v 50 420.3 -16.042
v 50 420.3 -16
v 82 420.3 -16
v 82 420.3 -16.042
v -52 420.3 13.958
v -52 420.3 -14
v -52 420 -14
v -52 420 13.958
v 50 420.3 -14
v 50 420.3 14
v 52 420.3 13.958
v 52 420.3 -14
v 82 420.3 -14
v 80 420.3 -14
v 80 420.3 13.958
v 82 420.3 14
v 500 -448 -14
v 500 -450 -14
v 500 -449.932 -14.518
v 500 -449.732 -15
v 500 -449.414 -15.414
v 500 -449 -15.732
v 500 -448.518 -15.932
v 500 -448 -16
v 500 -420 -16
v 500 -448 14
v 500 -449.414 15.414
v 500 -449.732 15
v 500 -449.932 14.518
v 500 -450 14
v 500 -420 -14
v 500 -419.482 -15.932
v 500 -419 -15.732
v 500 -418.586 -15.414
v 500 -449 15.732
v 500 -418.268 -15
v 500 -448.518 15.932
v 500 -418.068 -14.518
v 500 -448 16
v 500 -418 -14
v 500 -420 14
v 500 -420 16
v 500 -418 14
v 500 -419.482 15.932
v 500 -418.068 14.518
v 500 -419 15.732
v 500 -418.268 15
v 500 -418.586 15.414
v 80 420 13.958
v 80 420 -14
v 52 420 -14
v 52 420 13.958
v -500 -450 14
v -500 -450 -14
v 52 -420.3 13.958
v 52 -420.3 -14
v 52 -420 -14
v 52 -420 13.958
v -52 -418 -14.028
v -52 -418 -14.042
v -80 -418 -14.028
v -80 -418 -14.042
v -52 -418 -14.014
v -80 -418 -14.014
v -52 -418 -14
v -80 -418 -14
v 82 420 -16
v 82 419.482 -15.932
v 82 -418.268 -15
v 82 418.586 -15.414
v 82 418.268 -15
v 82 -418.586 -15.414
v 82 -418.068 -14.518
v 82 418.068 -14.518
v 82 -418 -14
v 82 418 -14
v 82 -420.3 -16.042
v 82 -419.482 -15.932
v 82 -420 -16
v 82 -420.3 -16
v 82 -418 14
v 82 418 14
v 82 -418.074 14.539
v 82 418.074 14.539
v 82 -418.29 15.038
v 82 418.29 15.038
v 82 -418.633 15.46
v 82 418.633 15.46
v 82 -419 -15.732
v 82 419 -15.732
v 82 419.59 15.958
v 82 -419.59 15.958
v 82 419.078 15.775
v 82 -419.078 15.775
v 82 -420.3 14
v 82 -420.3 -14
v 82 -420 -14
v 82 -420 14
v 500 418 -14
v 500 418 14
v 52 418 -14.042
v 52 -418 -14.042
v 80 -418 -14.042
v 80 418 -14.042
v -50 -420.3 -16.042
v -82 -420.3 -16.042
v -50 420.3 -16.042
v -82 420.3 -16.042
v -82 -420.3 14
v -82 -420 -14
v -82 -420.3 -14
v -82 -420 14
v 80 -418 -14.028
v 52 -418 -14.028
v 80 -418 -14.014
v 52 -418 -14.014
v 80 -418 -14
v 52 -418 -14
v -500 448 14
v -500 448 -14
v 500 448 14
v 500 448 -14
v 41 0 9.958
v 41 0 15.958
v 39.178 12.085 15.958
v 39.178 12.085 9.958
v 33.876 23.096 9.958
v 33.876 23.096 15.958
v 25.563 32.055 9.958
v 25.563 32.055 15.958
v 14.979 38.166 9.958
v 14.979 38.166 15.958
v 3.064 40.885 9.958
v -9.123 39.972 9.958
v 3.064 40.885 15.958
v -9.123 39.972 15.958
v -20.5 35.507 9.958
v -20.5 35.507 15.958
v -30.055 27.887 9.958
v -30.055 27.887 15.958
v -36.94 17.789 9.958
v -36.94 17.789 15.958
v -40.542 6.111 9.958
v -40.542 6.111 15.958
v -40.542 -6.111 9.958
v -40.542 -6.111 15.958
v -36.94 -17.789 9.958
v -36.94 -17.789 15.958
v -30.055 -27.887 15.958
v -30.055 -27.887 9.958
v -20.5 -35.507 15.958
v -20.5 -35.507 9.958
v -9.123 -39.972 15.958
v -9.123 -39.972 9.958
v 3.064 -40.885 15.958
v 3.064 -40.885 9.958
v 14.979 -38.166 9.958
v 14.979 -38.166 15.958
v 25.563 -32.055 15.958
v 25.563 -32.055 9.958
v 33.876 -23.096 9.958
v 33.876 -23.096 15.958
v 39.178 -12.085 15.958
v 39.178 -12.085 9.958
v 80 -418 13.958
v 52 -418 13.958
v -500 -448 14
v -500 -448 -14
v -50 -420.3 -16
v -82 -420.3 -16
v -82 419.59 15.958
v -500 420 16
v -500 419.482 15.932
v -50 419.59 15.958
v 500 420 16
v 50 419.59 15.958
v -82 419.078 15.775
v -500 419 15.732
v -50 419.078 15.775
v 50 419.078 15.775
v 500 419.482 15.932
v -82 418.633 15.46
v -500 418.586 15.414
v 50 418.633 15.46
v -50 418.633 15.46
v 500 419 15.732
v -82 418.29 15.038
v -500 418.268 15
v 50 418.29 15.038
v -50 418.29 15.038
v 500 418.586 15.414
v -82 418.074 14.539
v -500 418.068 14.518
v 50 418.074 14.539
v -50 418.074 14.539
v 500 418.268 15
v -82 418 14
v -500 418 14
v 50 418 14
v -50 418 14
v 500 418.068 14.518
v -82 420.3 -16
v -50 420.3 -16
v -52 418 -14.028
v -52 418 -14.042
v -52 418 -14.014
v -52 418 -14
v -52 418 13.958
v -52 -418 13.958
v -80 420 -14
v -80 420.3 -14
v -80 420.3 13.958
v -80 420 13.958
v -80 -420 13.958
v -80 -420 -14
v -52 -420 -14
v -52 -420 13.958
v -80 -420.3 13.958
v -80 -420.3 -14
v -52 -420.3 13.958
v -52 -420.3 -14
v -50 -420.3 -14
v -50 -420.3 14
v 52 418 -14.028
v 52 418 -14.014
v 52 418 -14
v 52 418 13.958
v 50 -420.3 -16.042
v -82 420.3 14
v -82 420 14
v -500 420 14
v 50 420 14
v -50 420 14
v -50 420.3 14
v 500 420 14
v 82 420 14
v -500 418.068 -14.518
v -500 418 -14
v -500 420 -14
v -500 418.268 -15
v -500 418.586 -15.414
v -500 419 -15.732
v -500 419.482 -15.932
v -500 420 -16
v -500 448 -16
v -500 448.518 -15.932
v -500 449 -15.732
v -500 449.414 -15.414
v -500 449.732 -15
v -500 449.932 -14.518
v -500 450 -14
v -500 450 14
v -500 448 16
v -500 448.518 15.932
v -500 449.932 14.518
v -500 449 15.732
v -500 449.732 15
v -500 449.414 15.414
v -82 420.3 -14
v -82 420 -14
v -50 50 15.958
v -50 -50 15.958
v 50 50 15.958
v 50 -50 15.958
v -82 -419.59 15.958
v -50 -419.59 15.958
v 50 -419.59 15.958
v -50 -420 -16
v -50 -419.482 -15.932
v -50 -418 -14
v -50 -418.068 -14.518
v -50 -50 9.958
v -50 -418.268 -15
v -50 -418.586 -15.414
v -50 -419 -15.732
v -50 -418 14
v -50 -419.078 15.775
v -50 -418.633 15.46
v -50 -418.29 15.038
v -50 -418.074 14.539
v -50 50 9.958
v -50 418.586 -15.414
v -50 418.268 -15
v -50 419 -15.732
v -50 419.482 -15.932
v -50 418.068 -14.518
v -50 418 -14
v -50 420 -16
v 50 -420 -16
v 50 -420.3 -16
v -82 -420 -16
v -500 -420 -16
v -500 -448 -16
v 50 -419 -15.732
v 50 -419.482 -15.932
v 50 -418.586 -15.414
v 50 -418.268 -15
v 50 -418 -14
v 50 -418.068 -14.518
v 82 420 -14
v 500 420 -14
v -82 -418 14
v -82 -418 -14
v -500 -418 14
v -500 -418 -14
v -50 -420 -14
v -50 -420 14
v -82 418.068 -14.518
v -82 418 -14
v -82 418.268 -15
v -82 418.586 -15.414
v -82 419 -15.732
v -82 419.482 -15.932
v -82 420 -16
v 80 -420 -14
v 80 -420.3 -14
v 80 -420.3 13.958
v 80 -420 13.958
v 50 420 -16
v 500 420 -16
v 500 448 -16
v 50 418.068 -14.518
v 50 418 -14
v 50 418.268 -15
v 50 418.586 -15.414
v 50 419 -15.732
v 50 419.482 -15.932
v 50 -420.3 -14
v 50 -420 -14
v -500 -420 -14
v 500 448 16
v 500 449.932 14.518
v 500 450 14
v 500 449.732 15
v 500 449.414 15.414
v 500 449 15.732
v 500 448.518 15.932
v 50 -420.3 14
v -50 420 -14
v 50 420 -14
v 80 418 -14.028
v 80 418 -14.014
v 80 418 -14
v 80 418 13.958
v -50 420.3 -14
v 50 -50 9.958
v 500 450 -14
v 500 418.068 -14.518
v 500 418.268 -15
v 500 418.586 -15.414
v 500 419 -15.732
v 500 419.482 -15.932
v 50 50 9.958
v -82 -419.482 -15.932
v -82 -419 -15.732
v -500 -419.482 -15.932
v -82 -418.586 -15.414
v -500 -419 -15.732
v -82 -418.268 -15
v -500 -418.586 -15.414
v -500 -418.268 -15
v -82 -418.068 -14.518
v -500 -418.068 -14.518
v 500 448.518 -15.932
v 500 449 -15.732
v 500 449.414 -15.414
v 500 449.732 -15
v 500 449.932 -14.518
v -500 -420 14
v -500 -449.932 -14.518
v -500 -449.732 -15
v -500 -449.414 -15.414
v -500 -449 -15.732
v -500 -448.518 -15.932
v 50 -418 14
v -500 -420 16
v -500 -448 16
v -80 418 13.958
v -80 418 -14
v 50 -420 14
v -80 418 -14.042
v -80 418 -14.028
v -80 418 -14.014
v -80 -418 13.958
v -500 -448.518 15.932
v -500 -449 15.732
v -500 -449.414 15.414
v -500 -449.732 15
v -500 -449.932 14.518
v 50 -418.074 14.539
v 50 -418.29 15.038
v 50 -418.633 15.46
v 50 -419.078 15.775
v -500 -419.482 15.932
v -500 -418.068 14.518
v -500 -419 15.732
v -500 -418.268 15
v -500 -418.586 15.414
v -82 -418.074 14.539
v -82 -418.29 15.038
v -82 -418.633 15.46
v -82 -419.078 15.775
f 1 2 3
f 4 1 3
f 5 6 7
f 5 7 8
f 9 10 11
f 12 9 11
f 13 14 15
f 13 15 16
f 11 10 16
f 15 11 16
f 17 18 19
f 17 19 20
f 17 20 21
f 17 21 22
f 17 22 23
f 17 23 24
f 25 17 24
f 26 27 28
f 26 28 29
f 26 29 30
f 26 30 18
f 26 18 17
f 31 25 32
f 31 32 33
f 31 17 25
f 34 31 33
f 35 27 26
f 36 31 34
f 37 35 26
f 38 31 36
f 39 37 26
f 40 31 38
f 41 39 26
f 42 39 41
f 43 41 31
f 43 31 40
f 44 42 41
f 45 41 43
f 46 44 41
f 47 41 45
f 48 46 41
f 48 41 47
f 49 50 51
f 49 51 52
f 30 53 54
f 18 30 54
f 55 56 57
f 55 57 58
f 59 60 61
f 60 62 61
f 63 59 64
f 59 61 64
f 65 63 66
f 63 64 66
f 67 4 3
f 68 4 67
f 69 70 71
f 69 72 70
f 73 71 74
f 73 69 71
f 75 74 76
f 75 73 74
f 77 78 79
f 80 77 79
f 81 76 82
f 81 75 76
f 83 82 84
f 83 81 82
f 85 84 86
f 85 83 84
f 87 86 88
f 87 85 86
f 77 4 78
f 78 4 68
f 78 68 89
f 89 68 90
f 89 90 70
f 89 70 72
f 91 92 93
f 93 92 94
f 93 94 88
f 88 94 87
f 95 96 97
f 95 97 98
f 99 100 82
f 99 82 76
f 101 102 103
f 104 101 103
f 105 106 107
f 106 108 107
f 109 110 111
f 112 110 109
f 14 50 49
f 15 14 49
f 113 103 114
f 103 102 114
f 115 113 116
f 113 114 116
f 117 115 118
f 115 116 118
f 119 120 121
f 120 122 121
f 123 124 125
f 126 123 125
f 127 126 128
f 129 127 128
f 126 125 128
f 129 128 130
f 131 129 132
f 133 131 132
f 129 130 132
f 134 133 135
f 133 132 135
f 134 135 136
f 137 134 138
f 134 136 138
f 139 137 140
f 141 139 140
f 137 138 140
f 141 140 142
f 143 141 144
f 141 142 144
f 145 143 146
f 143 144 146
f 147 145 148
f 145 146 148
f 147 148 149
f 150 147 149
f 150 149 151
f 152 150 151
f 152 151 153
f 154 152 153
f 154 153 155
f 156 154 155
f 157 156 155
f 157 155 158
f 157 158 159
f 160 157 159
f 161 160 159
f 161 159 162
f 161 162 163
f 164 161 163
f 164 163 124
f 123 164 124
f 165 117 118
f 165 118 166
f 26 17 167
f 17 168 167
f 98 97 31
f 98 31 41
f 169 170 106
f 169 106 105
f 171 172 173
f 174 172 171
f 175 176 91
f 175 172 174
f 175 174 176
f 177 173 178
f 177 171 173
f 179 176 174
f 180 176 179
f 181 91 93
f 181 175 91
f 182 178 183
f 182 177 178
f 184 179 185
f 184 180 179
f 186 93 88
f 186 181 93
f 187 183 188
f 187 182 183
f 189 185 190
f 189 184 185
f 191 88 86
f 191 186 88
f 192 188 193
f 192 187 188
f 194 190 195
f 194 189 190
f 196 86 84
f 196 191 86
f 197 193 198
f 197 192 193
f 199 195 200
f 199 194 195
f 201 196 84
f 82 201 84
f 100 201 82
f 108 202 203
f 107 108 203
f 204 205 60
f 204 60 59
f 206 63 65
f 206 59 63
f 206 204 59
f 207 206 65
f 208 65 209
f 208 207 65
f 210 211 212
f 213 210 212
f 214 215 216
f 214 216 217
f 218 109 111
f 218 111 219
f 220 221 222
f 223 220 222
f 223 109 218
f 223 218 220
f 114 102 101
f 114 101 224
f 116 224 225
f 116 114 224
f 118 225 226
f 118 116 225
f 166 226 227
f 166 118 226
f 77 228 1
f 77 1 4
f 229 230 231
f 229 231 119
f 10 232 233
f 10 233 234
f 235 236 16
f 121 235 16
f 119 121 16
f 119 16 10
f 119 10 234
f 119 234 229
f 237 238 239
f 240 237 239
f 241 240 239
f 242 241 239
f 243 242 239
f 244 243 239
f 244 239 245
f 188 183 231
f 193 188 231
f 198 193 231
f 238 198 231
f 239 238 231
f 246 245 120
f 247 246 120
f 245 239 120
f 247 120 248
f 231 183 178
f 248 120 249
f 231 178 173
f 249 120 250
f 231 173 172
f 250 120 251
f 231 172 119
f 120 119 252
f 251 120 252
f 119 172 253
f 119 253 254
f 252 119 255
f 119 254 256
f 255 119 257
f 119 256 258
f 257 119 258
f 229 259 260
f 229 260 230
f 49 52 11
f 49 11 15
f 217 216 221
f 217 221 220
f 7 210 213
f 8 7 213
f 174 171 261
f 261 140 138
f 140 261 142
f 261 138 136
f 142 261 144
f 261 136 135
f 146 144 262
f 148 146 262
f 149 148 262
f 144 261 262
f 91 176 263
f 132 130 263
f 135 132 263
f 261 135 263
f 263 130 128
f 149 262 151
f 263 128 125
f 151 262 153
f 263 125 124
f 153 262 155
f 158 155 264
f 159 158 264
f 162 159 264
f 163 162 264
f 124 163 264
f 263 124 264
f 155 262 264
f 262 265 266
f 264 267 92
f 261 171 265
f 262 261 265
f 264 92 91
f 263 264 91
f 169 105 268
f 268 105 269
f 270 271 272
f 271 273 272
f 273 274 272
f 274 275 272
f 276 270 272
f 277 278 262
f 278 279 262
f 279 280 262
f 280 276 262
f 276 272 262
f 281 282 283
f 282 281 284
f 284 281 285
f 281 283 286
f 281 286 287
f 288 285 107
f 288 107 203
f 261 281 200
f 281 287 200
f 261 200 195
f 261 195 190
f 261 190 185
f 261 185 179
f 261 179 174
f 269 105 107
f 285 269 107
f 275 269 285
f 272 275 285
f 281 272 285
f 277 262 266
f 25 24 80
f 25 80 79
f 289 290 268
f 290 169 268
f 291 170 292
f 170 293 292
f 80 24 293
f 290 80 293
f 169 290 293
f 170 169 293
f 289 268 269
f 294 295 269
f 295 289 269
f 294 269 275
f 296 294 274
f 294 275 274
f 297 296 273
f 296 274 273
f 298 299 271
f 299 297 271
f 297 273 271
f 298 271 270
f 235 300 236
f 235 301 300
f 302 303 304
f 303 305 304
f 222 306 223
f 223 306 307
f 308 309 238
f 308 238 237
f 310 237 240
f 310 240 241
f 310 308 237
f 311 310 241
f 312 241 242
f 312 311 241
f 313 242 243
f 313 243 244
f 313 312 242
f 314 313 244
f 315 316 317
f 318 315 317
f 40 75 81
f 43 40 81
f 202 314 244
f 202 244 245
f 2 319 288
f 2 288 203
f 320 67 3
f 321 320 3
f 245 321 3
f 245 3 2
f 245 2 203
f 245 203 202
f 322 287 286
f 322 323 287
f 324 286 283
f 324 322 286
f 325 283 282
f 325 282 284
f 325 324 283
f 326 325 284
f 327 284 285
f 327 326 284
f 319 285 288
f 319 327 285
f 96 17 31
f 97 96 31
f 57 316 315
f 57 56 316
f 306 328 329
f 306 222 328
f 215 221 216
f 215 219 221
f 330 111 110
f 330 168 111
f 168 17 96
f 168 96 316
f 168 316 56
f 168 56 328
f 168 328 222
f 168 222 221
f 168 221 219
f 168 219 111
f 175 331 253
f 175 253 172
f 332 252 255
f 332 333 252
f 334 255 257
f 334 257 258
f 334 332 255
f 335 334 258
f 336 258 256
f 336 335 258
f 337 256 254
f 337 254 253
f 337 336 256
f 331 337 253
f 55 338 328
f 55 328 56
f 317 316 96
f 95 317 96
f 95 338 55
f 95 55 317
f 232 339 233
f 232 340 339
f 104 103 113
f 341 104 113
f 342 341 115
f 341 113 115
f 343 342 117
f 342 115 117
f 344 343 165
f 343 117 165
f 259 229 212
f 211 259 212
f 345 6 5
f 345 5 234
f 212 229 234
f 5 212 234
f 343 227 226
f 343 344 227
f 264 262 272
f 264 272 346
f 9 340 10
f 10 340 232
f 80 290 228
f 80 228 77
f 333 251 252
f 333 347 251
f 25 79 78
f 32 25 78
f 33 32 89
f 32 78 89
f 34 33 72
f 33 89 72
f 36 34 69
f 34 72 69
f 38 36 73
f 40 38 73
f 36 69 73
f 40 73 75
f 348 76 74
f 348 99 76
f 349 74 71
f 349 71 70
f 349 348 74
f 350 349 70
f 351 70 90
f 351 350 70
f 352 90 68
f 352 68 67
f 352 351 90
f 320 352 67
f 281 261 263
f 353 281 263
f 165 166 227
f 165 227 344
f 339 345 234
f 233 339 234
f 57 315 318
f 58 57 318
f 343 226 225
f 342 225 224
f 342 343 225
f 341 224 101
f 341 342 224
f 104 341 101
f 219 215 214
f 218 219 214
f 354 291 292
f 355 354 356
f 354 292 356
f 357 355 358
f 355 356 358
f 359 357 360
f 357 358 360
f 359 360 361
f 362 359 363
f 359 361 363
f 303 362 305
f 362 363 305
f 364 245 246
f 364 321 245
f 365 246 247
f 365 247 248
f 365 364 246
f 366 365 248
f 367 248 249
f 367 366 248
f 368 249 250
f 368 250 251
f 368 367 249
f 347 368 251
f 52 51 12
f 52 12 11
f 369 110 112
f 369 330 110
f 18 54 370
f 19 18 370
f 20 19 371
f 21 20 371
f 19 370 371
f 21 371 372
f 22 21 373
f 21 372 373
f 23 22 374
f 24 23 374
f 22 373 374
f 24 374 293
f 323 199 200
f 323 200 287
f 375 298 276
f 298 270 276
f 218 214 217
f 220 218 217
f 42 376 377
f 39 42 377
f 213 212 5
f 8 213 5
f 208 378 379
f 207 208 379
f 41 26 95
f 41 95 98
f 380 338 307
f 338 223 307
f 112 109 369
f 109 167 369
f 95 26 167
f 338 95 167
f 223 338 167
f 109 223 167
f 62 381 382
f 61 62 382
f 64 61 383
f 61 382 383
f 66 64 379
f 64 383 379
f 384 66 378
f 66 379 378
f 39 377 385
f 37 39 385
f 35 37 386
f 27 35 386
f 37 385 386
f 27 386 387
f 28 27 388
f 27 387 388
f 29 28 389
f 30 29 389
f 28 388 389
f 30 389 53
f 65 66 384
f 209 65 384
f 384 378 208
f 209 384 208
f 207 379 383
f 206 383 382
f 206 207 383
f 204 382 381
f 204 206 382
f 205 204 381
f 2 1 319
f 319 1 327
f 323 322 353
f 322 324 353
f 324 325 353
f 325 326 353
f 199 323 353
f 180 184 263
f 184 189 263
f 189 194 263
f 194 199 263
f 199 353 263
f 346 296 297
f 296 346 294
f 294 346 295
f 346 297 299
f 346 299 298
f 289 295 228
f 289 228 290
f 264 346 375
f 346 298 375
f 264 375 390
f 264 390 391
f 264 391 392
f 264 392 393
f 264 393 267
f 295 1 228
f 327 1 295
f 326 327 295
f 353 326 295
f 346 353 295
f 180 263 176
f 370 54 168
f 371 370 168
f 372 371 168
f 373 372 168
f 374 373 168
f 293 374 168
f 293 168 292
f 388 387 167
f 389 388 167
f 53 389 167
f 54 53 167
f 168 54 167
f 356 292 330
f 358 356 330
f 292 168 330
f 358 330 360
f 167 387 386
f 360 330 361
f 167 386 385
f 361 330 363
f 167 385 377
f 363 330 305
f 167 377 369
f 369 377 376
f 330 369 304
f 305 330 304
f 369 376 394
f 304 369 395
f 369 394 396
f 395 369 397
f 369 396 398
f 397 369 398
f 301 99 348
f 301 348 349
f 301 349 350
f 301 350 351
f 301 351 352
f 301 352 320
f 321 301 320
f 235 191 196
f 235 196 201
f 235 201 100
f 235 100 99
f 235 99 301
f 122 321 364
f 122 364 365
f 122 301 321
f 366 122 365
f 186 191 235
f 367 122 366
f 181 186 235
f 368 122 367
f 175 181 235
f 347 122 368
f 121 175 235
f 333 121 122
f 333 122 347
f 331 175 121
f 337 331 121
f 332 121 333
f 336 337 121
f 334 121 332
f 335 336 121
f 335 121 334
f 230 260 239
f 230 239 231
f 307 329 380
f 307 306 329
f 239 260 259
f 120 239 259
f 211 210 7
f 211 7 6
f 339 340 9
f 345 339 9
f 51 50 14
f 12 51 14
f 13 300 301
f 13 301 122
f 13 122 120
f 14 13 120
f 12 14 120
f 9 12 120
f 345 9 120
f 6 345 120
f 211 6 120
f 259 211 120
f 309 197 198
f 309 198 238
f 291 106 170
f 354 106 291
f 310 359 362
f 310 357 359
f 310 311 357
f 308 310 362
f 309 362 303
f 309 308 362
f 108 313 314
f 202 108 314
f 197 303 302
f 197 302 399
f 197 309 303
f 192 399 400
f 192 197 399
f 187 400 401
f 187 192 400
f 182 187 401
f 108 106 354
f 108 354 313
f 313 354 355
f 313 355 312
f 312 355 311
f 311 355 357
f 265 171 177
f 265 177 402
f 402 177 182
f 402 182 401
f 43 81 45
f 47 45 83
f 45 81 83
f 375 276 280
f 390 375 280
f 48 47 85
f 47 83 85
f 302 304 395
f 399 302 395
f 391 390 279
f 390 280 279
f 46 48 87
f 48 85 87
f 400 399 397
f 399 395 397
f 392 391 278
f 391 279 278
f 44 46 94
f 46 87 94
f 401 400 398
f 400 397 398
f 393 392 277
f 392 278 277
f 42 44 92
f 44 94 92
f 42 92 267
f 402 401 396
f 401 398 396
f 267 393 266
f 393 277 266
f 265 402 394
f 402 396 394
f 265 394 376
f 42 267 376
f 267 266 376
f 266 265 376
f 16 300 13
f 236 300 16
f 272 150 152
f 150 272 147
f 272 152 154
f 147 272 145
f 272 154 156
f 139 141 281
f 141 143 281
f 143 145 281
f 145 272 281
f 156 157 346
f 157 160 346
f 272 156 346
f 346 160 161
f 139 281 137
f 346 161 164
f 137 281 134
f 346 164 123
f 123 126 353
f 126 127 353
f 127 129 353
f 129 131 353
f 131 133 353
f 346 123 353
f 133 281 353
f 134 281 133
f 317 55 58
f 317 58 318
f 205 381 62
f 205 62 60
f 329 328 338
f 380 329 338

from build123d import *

# Parameters (mm, degrees)
F0_W     = 28
F0_H     = 28
F1_DEPTH = 500
F2_W     = 32
F2_H     = 32
F2_W_2   = 28
F2_H_2   = 28
F3_DEPTH = 420.3
F4_W     = 100
F4_H     = 100
F5_DEPTH = 6
F6_R     = 41
F7_DEPTH = 25


with BuildPart() as f1:
    # F0 (on Right) → F1 (new body, symmetric)
    with BuildSketch(Plane.YZ):
        with BuildLine():
            ThreePointArc((-450, -14), (-449.414214, -15.414214), (-448, -16))
            Line((-448, -16), (-420, -16))
            ThreePointArc((-420, -16), (-418.585786, -15.414214), (-418, -14))
            Line((-418, -14), (-418, 14))
            ThreePointArc((-418, 14), (-418.585786, 15.414214), (-420, 16))
            Line((-420, 16), (-448, 16))
            ThreePointArc((-448, 16), (-449.414214, 15.414214), (-450, 14))
            Line((-450, 14), (-450, -14))
        make_face()
        with Locations((-434, 0)):
            Rectangle(F0_W, F0_H, mode=Mode.SUBTRACT)
        with BuildLine():
            ThreePointArc((450, 14), (449.414214, 15.414214), (448, 16))
            Line((448, 16), (420, 16))
            ThreePointArc((420, 16), (418.585786, 15.414214), (418, 14))
            Line((418, 14), (418, -14))
            ThreePointArc((418, -14), (418.585786, -15.414214), (420, -16))
            Line((420, -16), (448, -16))
            ThreePointArc((448, -16), (449.414214, -15.414214), (450, -14))
            Line((450, -14), (450, 14))
        make_face()
        with Locations((434, 0)):
            Rectangle(F0_W, F0_H, mode=Mode.SUBTRACT)
    extrude(amount=F1_DEPTH, both=True)

    # F2 (on Front) → F3 (join, symmetric)
    with BuildSketch(Plane.XZ):
        with Locations((-66, -0.042497)):
            Rectangle(F2_W, F2_H)
        with Locations((-66, -0.042497)):
            Rectangle(F2_W_2, F2_H_2, mode=Mode.SUBTRACT)
        with Locations((66, -0.042497)):
            Rectangle(F2_W, F2_H)
        with Locations((66, -0.042497)):
            Rectangle(F2_W_2, F2_H_2, mode=Mode.SUBTRACT)
    extrude(amount=F3_DEPTH, both=True)

    # F4 (on face) → F5 (join)
    with BuildSketch(Plane.XY.offset(15.957503)):
        Rectangle(F4_W, F4_H)
    extrude(amount=-F5_DEPTH)

    # F6 (on face) → F7 (cut)
    with BuildSketch(Plane.XY.offset(15.957503)):
        Circle(F6_R)
    extrude(amount=-F7_DEPTH, mode=Mode.SUBTRACT)


solid = f1.part
